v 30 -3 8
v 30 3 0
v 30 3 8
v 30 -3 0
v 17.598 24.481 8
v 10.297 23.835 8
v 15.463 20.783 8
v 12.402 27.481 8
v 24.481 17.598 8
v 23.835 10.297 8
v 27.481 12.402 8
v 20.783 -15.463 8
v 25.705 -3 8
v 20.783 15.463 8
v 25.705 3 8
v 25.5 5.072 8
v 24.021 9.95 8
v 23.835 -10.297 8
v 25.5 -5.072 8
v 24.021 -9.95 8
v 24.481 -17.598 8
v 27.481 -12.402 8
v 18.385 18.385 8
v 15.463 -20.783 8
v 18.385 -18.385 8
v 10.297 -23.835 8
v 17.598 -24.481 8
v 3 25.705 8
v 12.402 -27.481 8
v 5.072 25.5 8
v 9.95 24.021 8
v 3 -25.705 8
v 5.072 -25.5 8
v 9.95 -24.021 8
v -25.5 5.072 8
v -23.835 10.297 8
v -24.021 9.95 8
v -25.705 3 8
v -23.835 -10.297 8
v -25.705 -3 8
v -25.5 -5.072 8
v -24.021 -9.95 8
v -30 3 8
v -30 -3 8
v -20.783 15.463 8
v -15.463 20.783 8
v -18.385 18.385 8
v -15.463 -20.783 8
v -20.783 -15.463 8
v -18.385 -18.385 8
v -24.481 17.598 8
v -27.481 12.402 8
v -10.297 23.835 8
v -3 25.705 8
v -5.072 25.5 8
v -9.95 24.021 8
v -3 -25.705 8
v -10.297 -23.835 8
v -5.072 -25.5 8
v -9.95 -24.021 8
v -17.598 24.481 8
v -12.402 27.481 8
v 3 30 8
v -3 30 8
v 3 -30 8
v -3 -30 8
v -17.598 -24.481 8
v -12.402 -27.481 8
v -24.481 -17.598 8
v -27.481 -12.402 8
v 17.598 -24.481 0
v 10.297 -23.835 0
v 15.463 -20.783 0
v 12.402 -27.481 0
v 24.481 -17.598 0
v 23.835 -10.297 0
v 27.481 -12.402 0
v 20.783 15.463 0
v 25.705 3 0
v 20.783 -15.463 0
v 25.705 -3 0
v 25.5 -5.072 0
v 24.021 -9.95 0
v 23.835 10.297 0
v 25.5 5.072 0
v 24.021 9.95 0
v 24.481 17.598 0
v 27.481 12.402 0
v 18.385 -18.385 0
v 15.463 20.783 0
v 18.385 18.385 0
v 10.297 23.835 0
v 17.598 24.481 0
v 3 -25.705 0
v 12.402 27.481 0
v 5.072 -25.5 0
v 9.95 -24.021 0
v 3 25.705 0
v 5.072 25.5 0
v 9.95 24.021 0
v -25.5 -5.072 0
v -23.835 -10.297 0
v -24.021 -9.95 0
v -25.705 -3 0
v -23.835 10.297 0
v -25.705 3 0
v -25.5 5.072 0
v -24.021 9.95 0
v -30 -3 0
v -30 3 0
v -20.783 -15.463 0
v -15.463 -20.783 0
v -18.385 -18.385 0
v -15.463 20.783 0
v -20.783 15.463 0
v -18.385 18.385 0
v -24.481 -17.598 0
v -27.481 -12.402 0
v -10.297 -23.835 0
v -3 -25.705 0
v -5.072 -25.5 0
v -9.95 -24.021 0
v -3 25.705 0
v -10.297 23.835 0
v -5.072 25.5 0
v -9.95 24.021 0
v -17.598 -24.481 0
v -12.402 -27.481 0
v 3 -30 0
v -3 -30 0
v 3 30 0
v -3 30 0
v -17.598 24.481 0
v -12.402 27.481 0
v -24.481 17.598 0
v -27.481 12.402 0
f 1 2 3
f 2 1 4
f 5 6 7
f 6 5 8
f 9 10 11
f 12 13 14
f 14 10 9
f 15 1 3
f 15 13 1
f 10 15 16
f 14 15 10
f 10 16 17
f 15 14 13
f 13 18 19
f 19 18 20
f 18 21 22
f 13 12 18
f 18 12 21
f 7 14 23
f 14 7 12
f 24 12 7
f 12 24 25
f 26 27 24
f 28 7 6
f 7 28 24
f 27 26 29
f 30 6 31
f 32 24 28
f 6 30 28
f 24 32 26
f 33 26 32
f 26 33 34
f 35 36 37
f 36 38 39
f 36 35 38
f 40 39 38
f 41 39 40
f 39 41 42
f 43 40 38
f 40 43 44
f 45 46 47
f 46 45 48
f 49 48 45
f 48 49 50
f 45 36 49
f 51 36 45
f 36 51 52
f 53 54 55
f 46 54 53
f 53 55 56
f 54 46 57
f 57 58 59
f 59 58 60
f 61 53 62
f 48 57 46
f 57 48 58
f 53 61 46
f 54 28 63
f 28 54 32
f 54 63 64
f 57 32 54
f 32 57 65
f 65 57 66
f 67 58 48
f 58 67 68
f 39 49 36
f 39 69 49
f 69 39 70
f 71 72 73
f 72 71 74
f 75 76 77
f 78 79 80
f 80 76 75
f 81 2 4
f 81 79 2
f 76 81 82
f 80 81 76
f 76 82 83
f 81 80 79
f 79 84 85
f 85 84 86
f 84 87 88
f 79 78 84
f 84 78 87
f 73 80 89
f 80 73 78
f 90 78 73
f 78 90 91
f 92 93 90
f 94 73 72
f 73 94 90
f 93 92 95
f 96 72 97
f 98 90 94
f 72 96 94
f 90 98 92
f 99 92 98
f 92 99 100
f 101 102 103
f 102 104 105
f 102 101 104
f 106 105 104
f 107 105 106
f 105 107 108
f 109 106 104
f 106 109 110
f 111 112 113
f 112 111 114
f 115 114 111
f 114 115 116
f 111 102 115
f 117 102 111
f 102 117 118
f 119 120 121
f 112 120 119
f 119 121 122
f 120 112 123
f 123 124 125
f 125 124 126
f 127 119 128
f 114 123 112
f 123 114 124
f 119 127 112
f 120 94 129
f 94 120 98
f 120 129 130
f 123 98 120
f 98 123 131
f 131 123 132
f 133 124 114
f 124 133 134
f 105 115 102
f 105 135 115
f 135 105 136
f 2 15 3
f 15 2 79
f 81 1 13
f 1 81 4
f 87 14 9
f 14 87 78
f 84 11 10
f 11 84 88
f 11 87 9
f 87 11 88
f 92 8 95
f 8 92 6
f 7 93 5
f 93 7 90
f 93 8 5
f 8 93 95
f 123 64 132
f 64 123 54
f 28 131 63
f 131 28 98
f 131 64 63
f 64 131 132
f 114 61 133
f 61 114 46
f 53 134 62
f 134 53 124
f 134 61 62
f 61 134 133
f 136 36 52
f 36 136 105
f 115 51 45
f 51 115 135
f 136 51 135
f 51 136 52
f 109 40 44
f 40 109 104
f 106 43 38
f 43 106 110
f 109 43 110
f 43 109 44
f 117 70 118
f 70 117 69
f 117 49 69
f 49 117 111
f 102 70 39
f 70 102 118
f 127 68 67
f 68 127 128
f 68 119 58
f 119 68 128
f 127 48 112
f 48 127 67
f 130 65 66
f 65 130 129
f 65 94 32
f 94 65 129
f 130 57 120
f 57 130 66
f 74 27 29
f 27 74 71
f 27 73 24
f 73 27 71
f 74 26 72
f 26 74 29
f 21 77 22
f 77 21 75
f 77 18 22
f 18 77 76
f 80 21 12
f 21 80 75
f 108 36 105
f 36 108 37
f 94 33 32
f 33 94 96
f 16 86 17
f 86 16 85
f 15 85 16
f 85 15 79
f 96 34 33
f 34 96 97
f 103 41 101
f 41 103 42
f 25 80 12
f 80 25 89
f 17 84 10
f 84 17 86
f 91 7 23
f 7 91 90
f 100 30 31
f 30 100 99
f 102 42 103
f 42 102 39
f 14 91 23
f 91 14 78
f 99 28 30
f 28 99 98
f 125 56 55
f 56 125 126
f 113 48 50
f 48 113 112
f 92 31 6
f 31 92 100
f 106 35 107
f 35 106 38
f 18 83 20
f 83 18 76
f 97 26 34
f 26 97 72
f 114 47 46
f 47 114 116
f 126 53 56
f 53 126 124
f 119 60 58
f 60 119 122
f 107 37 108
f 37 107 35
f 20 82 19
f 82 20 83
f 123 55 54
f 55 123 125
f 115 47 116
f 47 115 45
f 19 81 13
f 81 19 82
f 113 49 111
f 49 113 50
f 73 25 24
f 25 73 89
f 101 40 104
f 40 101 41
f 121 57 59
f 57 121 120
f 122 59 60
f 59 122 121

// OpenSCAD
$fn = 32;

// ----------------------------------------------------------------------
// Spur blank: plain gear blank
// ----------------------------------------------------------------------

// --- parameters (mm) ---
disc_r = 26;              // blank root radius
disc_t = 8;               // blank thickness
n_teeth = 12;             // stub tooth count
tooth_w = 6;              // tooth width at the root
tooth_h = 4;              // tooth height above the root

out_r = disc_r + tooth_h;  // tip radius
bbox_x = 60.0;  // measured width over the teeth
bbox_y = 60.0;  // measured depth over the teeth

union() {
  cylinder(r = disc_r, h = disc_t);
  for (i = [0 : n_teeth - 1])
    rotate([0, 0, i * 360 / n_teeth])
      translate([disc_r - 1, -tooth_w / 2, 0])
        cube([tooth_h + 1, tooth_w, disc_t]);
}
